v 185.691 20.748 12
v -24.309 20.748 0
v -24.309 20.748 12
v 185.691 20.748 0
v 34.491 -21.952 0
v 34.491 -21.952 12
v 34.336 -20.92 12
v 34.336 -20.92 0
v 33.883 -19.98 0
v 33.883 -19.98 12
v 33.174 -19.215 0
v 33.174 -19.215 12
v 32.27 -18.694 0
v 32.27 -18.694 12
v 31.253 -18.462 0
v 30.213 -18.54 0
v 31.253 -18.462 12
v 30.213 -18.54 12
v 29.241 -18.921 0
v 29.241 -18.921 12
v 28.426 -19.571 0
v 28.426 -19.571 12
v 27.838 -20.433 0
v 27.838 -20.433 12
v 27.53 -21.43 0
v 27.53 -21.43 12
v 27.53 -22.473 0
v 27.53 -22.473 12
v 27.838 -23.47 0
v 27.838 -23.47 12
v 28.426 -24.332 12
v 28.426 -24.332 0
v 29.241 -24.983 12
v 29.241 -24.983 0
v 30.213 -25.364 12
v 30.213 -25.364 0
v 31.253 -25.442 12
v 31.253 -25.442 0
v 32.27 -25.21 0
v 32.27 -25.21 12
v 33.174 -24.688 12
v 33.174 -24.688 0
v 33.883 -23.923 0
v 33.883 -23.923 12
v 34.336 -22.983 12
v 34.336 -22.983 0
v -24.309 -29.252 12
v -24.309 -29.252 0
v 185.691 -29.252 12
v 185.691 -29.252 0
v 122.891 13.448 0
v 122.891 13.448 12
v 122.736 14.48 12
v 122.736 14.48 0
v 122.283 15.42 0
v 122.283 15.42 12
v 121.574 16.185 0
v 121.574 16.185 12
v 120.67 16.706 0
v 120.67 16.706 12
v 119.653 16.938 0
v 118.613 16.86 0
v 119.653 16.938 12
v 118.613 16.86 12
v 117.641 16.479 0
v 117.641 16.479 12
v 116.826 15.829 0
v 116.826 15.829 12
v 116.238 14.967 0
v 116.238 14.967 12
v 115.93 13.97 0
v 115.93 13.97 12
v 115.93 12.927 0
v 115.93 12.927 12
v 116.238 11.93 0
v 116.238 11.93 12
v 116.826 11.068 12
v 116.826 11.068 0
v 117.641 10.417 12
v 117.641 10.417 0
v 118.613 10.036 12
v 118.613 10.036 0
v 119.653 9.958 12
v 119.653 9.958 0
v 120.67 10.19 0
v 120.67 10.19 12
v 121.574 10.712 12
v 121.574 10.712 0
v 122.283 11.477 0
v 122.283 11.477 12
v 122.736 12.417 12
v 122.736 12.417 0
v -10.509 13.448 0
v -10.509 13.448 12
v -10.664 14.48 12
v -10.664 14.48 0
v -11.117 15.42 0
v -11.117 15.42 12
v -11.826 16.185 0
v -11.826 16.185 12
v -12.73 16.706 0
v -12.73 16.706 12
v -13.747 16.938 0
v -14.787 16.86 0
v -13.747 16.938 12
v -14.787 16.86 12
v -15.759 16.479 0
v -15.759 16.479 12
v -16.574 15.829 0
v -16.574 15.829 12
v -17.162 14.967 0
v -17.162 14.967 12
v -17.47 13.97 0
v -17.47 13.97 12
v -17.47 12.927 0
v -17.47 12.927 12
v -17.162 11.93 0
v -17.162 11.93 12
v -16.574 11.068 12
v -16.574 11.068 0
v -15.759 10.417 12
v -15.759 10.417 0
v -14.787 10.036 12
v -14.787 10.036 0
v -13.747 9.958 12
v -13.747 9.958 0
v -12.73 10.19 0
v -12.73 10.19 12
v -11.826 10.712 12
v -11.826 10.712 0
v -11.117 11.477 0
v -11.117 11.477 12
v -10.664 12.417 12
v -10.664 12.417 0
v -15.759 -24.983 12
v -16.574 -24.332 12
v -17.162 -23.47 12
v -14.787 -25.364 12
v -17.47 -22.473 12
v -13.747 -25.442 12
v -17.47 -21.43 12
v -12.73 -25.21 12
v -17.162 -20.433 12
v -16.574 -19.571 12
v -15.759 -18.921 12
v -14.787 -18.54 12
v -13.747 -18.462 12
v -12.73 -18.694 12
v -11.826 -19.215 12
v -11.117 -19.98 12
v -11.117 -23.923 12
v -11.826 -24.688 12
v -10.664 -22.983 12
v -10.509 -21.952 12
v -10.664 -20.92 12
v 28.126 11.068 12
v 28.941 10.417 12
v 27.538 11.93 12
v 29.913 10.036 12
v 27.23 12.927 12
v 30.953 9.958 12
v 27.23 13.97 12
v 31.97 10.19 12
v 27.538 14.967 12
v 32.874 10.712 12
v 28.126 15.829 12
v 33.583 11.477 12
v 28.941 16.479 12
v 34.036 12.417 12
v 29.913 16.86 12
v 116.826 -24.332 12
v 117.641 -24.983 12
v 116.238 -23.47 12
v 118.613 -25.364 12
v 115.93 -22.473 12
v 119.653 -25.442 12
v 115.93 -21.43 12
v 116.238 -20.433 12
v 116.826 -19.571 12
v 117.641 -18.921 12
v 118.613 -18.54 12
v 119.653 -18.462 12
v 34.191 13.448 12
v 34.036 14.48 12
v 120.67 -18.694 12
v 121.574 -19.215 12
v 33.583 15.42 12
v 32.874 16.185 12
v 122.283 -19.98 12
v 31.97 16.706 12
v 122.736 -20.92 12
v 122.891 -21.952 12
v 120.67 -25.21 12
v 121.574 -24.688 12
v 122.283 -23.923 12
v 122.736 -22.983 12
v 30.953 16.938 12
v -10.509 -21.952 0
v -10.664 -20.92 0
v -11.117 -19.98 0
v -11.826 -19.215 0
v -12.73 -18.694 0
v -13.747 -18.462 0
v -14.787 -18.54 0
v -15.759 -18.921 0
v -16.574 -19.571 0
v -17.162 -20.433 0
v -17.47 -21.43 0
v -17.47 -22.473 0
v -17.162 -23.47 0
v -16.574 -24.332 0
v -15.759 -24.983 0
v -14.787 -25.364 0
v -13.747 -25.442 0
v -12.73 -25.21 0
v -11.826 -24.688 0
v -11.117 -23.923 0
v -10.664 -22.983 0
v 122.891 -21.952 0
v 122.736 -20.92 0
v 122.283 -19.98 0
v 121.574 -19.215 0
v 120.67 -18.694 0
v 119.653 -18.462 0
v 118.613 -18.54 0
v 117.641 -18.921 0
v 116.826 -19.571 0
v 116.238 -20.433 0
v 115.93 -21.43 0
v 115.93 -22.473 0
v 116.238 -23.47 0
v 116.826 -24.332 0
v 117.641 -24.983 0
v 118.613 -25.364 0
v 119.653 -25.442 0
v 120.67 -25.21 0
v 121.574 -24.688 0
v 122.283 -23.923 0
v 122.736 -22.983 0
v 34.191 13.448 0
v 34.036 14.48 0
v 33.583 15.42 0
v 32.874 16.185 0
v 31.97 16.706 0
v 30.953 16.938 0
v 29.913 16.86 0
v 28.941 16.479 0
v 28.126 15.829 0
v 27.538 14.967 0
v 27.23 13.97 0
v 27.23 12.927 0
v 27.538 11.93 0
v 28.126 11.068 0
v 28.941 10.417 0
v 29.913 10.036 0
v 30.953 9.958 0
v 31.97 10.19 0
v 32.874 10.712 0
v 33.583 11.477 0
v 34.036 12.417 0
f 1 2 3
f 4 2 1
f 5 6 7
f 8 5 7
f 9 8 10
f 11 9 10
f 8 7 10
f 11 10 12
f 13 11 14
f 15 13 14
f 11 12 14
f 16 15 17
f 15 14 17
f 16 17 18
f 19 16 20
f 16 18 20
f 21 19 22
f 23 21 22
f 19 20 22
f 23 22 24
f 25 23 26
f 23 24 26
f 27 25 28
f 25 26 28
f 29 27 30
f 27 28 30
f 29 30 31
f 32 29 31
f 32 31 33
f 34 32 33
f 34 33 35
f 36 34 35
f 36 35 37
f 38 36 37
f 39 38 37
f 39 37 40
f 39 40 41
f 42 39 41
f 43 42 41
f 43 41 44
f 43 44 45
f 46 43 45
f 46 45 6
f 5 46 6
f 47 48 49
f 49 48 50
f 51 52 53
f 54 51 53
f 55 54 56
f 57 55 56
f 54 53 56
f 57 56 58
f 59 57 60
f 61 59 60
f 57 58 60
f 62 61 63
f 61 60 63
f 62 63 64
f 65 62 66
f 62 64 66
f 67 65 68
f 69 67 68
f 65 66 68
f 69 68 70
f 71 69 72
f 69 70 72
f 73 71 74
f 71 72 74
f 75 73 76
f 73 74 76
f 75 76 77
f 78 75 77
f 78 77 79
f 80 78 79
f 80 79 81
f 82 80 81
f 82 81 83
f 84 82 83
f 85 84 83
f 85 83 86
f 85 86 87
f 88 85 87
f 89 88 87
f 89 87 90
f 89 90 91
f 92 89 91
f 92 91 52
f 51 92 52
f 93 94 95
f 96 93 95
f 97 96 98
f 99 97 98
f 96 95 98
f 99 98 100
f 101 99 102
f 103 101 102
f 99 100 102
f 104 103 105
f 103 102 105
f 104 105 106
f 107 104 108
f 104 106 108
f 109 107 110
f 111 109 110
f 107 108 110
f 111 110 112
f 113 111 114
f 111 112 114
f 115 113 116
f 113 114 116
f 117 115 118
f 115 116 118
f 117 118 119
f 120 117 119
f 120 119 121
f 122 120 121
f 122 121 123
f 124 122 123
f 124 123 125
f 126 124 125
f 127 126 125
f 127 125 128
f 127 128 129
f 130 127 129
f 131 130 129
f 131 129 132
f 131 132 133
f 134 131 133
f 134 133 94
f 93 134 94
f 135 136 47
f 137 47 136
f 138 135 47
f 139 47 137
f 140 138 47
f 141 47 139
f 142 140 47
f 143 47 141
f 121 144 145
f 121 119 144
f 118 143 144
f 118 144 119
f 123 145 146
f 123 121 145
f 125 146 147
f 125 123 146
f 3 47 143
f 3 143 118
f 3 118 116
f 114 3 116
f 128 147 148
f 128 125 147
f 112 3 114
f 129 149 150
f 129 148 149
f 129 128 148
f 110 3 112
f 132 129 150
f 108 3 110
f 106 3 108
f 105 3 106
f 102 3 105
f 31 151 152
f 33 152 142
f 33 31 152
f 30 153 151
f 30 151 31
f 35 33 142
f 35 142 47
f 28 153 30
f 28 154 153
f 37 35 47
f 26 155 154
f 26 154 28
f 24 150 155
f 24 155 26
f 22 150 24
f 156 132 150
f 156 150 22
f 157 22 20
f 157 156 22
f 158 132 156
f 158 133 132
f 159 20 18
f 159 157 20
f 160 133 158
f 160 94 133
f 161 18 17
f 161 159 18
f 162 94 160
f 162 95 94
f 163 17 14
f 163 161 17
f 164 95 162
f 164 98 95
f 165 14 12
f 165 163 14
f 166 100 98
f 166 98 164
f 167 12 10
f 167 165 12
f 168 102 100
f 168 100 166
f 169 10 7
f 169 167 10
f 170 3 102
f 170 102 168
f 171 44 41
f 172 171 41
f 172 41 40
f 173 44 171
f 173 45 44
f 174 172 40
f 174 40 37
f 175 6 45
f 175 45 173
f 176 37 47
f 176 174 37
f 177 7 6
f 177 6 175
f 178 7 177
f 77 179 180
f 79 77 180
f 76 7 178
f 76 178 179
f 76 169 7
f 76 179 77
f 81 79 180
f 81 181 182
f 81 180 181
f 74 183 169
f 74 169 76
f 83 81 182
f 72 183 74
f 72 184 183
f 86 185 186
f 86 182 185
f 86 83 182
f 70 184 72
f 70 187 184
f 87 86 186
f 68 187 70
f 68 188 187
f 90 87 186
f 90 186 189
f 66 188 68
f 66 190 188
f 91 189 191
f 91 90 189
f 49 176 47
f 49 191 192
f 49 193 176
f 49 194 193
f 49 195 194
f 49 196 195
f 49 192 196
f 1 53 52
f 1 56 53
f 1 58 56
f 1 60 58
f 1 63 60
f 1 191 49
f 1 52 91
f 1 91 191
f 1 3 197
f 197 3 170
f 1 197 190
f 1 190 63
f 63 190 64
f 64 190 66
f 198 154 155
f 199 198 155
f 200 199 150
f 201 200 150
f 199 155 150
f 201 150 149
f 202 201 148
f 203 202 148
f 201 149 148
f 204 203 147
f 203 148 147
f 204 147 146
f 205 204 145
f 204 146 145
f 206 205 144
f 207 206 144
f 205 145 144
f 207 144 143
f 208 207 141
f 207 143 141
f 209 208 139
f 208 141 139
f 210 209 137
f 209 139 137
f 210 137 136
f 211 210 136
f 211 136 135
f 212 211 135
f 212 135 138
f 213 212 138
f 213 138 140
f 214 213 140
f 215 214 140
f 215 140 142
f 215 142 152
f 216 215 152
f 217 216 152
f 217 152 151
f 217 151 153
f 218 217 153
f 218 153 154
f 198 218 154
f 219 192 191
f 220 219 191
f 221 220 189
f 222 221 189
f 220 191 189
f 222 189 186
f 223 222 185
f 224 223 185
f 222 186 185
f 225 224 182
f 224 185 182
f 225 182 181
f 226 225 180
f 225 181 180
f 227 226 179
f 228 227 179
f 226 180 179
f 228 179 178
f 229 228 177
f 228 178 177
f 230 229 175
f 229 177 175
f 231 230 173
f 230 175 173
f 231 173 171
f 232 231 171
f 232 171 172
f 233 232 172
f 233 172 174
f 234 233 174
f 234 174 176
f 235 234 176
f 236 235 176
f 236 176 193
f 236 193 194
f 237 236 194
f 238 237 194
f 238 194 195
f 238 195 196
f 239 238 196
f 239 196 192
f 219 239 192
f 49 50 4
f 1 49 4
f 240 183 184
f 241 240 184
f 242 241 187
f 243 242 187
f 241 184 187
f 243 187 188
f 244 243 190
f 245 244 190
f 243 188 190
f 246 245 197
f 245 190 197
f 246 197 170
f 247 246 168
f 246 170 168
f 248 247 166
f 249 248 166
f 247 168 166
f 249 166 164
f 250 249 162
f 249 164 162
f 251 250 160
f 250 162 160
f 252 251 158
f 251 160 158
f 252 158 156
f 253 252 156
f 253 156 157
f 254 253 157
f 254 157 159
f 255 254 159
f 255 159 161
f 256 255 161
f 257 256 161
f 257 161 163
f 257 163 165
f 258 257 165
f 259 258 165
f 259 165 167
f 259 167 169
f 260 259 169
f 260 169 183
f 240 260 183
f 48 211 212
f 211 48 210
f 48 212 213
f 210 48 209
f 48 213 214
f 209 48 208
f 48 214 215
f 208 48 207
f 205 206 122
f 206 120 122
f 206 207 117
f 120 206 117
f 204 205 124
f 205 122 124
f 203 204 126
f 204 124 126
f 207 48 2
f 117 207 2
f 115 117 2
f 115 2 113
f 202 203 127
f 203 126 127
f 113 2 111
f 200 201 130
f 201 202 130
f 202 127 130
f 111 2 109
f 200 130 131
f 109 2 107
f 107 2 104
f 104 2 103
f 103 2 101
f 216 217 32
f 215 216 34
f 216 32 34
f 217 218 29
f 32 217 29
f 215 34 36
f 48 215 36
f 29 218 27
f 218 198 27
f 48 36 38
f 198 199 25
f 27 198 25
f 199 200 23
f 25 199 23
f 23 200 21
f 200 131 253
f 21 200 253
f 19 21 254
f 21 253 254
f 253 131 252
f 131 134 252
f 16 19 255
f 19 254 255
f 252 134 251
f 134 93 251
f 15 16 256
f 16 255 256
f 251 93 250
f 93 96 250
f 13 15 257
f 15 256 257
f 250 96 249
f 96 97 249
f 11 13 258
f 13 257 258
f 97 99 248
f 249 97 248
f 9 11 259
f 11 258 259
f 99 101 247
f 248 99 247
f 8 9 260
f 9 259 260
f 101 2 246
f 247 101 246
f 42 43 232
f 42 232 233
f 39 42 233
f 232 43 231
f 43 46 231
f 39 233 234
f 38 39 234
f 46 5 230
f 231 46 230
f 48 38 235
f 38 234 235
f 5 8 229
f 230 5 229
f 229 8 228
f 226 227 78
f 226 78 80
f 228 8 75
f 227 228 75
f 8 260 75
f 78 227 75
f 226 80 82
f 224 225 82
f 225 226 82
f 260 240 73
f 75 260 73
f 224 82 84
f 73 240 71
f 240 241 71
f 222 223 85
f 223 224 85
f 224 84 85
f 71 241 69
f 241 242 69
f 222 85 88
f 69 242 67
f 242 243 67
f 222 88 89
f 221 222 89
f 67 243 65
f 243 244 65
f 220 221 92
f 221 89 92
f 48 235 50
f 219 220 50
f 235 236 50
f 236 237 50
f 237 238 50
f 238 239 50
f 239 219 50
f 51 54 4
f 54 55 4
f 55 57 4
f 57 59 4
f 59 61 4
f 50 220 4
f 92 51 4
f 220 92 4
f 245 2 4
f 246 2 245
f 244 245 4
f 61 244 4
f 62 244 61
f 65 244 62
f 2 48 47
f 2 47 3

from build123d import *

# Parameters (mm, degrees)
F0_W     = 210
F0_H     = 50
F1_DEPTH = 12
F2_R     = 3.5
F3_DEPTH = 25
F4_R     = 3.5
F5_DEPTH = 25


# Not quite as in the source:
# - a feature names something its author has since deleted; it is built from what else it names


with BuildPart() as f1:
    # F0 (on Top) → F1 (new body)
    with BuildSketch(Plane.XY):
        with Locations((80.6913864613, -4.2518138885)):
            Rectangle(F0_W, F0_H)
    extrude(amount=F1_DEPTH)

    # F2 (on face) → F3 (cut)
    with BuildSketch(Plane.XY.offset(12)):
        with Locations((119.3913864613, 13.4481861115)):
            Circle(F2_R)
        with Locations((119.3913864613, -21.9518138885)):
            Circle(F2_R)
        with Locations((30.9913864613, -21.9518138885)):
            Circle(F2_R)
        with Locations((-14.0086135387, 13.4481861115)):
            Circle(F2_R)
        with Locations((-14.0086135387, -21.9518138885)):
            Circle(F2_R)
    extrude(amount=-F3_DEPTH, mode=Mode.SUBTRACT)

    # F4 (on face) → F5 (cut)
    with BuildSketch(Plane.XY.offset(12)):
        with Locations((30.6913864613, 13.4481861115)):
            Circle(F4_R)
    extrude(amount=-F5_DEPTH, mode=Mode.SUBTRACT)


solid = f1.part
